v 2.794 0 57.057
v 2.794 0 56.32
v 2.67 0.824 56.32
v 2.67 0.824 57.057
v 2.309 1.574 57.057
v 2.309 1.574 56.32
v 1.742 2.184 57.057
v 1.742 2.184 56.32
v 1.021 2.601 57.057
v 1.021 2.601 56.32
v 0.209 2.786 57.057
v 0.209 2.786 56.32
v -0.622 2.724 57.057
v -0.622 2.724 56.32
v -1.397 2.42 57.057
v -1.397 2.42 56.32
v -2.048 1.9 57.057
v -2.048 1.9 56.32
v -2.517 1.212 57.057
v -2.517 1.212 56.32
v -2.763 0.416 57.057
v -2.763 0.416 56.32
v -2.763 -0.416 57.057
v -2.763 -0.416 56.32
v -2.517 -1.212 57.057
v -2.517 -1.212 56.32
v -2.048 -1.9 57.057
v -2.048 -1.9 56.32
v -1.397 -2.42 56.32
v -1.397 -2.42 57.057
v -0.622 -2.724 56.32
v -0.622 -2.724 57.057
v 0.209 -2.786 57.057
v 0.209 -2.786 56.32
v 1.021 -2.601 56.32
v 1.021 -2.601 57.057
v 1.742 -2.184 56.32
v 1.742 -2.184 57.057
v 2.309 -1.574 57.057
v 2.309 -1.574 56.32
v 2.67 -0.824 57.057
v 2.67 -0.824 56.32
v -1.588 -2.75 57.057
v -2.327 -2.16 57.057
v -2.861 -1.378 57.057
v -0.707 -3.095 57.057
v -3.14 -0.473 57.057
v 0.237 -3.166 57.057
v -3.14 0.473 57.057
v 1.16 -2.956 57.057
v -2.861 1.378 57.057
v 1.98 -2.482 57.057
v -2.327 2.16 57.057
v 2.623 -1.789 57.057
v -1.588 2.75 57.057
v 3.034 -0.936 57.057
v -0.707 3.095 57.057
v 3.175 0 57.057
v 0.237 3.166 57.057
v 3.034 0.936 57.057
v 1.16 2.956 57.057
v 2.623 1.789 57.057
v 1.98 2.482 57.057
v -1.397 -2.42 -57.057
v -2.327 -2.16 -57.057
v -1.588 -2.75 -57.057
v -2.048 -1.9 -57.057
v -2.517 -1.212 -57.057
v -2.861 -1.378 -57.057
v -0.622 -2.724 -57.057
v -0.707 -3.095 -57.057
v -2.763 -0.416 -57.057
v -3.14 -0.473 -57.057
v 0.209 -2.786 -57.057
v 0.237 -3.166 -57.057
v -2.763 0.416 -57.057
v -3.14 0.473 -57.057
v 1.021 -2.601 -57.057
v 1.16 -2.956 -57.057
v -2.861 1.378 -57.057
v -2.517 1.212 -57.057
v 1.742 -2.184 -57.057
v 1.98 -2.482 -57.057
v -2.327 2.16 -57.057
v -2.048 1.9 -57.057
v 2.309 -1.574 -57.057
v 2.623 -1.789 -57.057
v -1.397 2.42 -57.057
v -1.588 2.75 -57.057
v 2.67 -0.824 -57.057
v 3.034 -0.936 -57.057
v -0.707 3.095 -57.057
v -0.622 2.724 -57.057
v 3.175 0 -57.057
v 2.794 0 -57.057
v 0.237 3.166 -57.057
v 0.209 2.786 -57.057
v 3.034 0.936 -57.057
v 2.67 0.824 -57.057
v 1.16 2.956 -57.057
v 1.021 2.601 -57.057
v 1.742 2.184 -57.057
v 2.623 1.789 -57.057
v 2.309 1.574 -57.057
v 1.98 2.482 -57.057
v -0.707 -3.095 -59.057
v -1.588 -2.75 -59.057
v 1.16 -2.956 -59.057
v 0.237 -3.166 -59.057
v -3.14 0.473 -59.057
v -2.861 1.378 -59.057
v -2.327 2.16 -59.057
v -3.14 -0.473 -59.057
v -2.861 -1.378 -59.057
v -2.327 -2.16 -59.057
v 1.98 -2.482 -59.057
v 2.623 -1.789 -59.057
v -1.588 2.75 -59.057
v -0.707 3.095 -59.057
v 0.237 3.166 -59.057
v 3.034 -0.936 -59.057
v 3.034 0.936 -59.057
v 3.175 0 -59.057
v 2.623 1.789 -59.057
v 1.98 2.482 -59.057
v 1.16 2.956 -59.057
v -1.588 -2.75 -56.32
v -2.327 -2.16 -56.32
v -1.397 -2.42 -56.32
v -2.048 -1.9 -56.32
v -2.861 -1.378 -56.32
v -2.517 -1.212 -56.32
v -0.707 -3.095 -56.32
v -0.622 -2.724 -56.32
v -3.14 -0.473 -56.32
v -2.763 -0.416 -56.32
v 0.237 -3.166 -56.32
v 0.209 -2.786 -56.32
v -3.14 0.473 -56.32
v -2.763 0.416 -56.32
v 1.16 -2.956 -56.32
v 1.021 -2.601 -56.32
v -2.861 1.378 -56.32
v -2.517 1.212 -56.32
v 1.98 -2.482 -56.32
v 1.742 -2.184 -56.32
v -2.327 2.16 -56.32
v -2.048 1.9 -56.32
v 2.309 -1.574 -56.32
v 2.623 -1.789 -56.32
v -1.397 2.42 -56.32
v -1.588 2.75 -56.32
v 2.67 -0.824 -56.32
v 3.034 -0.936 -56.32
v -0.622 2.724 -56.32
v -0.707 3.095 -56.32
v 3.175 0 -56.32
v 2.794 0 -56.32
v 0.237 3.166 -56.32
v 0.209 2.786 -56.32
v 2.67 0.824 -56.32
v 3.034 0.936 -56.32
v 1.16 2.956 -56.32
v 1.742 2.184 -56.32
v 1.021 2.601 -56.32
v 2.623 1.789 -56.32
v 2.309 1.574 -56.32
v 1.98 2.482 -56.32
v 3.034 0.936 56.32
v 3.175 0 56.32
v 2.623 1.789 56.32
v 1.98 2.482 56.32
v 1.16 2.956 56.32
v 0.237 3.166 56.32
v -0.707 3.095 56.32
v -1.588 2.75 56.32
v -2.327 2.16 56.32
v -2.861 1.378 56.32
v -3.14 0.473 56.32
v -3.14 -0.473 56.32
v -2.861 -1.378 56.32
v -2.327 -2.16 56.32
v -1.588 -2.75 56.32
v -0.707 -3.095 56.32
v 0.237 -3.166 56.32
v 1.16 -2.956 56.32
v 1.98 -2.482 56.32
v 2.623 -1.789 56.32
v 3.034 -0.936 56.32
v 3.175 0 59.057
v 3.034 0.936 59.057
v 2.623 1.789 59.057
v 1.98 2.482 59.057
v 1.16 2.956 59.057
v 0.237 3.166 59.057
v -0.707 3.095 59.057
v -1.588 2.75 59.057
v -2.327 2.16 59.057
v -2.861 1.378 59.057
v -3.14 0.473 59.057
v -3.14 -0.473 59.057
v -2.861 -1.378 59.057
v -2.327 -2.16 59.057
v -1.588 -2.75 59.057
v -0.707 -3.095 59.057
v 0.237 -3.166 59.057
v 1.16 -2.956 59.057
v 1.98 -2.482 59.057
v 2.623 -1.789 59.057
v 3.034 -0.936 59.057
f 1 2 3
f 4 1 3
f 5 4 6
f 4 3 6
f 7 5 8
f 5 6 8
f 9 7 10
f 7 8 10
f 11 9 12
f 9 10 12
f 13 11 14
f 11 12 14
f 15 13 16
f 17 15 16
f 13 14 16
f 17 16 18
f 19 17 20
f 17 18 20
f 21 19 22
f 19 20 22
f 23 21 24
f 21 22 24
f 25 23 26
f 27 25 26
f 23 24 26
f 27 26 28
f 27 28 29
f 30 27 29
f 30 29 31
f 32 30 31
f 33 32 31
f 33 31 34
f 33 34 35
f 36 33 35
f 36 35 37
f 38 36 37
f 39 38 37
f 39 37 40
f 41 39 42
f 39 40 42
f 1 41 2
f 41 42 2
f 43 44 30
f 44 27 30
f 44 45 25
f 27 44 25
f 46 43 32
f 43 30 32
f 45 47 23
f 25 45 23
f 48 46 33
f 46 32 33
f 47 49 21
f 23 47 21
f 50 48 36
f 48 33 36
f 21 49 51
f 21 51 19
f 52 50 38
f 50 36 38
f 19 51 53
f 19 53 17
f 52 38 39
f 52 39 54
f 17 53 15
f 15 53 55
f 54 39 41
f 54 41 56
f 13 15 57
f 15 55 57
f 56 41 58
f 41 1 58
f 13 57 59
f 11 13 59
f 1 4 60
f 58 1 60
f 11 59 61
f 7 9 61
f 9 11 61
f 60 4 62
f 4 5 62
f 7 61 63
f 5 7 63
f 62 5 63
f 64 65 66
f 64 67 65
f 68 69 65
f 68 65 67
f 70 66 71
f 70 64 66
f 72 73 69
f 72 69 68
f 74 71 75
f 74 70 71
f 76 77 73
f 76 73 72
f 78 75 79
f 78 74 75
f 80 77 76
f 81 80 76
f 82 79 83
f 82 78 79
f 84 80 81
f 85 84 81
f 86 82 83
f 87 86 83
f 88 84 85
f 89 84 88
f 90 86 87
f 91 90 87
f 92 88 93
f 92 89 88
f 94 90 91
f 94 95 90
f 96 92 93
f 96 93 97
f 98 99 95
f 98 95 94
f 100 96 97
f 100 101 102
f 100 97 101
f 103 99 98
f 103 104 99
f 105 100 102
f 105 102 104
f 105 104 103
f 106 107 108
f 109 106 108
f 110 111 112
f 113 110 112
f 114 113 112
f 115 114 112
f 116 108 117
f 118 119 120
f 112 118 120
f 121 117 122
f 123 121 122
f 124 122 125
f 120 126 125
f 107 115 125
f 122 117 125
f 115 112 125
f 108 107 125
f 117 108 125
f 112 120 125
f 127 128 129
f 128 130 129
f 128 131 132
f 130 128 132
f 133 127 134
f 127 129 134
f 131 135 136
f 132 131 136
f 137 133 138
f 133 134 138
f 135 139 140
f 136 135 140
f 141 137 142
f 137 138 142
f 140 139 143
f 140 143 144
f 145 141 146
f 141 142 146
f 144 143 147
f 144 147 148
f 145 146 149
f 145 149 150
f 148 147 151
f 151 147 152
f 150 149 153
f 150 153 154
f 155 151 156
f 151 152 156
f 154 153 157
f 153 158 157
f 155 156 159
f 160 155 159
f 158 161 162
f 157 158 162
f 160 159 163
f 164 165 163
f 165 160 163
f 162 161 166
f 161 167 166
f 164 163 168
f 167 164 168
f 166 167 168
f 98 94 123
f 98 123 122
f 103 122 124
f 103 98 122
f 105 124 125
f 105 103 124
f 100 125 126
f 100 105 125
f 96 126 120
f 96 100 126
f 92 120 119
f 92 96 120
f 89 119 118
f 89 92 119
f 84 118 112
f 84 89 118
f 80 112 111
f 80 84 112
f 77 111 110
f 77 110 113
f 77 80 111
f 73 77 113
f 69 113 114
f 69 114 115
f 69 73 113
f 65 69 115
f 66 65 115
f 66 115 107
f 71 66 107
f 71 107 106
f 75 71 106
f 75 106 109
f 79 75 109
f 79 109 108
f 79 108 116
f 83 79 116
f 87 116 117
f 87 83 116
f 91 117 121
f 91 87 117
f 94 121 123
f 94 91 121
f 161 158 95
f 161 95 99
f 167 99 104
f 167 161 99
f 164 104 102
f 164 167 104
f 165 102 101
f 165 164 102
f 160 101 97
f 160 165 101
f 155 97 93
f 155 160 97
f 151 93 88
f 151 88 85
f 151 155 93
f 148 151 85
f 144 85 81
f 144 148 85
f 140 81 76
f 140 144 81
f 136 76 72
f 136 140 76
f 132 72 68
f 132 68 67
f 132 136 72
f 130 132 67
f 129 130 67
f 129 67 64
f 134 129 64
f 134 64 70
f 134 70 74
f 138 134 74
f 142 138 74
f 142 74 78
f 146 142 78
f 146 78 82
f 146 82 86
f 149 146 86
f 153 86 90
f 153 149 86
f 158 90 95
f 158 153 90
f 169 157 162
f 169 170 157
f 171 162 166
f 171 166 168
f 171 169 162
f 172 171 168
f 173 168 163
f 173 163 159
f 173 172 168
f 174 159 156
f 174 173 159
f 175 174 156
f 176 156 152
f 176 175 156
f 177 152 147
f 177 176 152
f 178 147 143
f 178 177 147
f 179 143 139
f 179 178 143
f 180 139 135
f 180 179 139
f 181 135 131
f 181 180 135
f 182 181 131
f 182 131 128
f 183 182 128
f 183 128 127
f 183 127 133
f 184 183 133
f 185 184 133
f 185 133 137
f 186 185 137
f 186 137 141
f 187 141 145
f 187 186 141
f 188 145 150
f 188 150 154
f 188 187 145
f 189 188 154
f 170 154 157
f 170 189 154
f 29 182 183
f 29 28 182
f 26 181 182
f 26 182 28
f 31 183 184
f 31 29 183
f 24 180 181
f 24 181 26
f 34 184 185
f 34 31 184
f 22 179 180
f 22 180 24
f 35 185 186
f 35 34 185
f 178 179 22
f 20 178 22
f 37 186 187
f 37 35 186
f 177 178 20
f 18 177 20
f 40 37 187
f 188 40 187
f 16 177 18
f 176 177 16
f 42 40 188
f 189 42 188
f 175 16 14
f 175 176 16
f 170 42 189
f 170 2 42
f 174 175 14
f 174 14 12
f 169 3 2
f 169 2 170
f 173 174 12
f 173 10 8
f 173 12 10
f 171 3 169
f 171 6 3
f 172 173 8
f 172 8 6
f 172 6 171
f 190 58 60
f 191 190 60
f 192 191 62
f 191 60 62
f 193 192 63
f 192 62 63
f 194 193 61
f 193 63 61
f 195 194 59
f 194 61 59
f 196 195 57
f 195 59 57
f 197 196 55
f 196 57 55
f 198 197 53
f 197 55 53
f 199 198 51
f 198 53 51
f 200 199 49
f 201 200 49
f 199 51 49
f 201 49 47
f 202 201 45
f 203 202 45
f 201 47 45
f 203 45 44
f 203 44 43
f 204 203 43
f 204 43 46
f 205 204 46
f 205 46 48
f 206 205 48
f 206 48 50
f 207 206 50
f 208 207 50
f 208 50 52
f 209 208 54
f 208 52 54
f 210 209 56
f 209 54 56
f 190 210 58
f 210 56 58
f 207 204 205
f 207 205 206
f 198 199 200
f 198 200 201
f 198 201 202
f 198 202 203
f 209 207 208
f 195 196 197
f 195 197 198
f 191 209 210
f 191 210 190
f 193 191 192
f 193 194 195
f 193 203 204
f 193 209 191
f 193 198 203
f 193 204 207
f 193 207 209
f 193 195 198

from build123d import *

# Parameters (mm, degrees)
SKETCH2_R           = 3.175
BOSS_EXTRUDE1_DEPTH = 56.32
SKETCH3_R           = 2.794
BOSS_EXTRUDE2_DEPTH = 0.7366
SKETCH4_R           = 3.175
BOSS_EXTRUDE3_DEPTH = 2


with BuildPart() as part:
    # Sketch2 → Boss-Extrude1 (new body)
    with BuildSketch(Plane.XY):
        Circle(SKETCH2_R)
    boss_extrude1 = extrude(amount=BOSS_EXTRUDE1_DEPTH)

    # Sketch3 → Boss-Extrude2 (add)
    with BuildSketch(Plane.XY.offset(56.32)):
        Circle(SKETCH3_R)
    boss_extrude2 = extrude(amount=BOSS_EXTRUDE2_DEPTH)

    # Sketch4 → Boss-Extrude3 (add)
    with BuildSketch(Plane.XY.offset(57.0566)):
        Circle(SKETCH4_R)
    boss_extrude3 = extrude(amount=BOSS_EXTRUDE3_DEPTH)

    # Mirror1: Boss-Extrude1, Boss-Extrude2, Boss-Extrude3 across plane
    add(boss_extrude1.mirror(Plane.XY))
    add(boss_extrude2.mirror(Plane.XY))
    add(boss_extrude3.mirror(Plane.XY))


solid = part.part
